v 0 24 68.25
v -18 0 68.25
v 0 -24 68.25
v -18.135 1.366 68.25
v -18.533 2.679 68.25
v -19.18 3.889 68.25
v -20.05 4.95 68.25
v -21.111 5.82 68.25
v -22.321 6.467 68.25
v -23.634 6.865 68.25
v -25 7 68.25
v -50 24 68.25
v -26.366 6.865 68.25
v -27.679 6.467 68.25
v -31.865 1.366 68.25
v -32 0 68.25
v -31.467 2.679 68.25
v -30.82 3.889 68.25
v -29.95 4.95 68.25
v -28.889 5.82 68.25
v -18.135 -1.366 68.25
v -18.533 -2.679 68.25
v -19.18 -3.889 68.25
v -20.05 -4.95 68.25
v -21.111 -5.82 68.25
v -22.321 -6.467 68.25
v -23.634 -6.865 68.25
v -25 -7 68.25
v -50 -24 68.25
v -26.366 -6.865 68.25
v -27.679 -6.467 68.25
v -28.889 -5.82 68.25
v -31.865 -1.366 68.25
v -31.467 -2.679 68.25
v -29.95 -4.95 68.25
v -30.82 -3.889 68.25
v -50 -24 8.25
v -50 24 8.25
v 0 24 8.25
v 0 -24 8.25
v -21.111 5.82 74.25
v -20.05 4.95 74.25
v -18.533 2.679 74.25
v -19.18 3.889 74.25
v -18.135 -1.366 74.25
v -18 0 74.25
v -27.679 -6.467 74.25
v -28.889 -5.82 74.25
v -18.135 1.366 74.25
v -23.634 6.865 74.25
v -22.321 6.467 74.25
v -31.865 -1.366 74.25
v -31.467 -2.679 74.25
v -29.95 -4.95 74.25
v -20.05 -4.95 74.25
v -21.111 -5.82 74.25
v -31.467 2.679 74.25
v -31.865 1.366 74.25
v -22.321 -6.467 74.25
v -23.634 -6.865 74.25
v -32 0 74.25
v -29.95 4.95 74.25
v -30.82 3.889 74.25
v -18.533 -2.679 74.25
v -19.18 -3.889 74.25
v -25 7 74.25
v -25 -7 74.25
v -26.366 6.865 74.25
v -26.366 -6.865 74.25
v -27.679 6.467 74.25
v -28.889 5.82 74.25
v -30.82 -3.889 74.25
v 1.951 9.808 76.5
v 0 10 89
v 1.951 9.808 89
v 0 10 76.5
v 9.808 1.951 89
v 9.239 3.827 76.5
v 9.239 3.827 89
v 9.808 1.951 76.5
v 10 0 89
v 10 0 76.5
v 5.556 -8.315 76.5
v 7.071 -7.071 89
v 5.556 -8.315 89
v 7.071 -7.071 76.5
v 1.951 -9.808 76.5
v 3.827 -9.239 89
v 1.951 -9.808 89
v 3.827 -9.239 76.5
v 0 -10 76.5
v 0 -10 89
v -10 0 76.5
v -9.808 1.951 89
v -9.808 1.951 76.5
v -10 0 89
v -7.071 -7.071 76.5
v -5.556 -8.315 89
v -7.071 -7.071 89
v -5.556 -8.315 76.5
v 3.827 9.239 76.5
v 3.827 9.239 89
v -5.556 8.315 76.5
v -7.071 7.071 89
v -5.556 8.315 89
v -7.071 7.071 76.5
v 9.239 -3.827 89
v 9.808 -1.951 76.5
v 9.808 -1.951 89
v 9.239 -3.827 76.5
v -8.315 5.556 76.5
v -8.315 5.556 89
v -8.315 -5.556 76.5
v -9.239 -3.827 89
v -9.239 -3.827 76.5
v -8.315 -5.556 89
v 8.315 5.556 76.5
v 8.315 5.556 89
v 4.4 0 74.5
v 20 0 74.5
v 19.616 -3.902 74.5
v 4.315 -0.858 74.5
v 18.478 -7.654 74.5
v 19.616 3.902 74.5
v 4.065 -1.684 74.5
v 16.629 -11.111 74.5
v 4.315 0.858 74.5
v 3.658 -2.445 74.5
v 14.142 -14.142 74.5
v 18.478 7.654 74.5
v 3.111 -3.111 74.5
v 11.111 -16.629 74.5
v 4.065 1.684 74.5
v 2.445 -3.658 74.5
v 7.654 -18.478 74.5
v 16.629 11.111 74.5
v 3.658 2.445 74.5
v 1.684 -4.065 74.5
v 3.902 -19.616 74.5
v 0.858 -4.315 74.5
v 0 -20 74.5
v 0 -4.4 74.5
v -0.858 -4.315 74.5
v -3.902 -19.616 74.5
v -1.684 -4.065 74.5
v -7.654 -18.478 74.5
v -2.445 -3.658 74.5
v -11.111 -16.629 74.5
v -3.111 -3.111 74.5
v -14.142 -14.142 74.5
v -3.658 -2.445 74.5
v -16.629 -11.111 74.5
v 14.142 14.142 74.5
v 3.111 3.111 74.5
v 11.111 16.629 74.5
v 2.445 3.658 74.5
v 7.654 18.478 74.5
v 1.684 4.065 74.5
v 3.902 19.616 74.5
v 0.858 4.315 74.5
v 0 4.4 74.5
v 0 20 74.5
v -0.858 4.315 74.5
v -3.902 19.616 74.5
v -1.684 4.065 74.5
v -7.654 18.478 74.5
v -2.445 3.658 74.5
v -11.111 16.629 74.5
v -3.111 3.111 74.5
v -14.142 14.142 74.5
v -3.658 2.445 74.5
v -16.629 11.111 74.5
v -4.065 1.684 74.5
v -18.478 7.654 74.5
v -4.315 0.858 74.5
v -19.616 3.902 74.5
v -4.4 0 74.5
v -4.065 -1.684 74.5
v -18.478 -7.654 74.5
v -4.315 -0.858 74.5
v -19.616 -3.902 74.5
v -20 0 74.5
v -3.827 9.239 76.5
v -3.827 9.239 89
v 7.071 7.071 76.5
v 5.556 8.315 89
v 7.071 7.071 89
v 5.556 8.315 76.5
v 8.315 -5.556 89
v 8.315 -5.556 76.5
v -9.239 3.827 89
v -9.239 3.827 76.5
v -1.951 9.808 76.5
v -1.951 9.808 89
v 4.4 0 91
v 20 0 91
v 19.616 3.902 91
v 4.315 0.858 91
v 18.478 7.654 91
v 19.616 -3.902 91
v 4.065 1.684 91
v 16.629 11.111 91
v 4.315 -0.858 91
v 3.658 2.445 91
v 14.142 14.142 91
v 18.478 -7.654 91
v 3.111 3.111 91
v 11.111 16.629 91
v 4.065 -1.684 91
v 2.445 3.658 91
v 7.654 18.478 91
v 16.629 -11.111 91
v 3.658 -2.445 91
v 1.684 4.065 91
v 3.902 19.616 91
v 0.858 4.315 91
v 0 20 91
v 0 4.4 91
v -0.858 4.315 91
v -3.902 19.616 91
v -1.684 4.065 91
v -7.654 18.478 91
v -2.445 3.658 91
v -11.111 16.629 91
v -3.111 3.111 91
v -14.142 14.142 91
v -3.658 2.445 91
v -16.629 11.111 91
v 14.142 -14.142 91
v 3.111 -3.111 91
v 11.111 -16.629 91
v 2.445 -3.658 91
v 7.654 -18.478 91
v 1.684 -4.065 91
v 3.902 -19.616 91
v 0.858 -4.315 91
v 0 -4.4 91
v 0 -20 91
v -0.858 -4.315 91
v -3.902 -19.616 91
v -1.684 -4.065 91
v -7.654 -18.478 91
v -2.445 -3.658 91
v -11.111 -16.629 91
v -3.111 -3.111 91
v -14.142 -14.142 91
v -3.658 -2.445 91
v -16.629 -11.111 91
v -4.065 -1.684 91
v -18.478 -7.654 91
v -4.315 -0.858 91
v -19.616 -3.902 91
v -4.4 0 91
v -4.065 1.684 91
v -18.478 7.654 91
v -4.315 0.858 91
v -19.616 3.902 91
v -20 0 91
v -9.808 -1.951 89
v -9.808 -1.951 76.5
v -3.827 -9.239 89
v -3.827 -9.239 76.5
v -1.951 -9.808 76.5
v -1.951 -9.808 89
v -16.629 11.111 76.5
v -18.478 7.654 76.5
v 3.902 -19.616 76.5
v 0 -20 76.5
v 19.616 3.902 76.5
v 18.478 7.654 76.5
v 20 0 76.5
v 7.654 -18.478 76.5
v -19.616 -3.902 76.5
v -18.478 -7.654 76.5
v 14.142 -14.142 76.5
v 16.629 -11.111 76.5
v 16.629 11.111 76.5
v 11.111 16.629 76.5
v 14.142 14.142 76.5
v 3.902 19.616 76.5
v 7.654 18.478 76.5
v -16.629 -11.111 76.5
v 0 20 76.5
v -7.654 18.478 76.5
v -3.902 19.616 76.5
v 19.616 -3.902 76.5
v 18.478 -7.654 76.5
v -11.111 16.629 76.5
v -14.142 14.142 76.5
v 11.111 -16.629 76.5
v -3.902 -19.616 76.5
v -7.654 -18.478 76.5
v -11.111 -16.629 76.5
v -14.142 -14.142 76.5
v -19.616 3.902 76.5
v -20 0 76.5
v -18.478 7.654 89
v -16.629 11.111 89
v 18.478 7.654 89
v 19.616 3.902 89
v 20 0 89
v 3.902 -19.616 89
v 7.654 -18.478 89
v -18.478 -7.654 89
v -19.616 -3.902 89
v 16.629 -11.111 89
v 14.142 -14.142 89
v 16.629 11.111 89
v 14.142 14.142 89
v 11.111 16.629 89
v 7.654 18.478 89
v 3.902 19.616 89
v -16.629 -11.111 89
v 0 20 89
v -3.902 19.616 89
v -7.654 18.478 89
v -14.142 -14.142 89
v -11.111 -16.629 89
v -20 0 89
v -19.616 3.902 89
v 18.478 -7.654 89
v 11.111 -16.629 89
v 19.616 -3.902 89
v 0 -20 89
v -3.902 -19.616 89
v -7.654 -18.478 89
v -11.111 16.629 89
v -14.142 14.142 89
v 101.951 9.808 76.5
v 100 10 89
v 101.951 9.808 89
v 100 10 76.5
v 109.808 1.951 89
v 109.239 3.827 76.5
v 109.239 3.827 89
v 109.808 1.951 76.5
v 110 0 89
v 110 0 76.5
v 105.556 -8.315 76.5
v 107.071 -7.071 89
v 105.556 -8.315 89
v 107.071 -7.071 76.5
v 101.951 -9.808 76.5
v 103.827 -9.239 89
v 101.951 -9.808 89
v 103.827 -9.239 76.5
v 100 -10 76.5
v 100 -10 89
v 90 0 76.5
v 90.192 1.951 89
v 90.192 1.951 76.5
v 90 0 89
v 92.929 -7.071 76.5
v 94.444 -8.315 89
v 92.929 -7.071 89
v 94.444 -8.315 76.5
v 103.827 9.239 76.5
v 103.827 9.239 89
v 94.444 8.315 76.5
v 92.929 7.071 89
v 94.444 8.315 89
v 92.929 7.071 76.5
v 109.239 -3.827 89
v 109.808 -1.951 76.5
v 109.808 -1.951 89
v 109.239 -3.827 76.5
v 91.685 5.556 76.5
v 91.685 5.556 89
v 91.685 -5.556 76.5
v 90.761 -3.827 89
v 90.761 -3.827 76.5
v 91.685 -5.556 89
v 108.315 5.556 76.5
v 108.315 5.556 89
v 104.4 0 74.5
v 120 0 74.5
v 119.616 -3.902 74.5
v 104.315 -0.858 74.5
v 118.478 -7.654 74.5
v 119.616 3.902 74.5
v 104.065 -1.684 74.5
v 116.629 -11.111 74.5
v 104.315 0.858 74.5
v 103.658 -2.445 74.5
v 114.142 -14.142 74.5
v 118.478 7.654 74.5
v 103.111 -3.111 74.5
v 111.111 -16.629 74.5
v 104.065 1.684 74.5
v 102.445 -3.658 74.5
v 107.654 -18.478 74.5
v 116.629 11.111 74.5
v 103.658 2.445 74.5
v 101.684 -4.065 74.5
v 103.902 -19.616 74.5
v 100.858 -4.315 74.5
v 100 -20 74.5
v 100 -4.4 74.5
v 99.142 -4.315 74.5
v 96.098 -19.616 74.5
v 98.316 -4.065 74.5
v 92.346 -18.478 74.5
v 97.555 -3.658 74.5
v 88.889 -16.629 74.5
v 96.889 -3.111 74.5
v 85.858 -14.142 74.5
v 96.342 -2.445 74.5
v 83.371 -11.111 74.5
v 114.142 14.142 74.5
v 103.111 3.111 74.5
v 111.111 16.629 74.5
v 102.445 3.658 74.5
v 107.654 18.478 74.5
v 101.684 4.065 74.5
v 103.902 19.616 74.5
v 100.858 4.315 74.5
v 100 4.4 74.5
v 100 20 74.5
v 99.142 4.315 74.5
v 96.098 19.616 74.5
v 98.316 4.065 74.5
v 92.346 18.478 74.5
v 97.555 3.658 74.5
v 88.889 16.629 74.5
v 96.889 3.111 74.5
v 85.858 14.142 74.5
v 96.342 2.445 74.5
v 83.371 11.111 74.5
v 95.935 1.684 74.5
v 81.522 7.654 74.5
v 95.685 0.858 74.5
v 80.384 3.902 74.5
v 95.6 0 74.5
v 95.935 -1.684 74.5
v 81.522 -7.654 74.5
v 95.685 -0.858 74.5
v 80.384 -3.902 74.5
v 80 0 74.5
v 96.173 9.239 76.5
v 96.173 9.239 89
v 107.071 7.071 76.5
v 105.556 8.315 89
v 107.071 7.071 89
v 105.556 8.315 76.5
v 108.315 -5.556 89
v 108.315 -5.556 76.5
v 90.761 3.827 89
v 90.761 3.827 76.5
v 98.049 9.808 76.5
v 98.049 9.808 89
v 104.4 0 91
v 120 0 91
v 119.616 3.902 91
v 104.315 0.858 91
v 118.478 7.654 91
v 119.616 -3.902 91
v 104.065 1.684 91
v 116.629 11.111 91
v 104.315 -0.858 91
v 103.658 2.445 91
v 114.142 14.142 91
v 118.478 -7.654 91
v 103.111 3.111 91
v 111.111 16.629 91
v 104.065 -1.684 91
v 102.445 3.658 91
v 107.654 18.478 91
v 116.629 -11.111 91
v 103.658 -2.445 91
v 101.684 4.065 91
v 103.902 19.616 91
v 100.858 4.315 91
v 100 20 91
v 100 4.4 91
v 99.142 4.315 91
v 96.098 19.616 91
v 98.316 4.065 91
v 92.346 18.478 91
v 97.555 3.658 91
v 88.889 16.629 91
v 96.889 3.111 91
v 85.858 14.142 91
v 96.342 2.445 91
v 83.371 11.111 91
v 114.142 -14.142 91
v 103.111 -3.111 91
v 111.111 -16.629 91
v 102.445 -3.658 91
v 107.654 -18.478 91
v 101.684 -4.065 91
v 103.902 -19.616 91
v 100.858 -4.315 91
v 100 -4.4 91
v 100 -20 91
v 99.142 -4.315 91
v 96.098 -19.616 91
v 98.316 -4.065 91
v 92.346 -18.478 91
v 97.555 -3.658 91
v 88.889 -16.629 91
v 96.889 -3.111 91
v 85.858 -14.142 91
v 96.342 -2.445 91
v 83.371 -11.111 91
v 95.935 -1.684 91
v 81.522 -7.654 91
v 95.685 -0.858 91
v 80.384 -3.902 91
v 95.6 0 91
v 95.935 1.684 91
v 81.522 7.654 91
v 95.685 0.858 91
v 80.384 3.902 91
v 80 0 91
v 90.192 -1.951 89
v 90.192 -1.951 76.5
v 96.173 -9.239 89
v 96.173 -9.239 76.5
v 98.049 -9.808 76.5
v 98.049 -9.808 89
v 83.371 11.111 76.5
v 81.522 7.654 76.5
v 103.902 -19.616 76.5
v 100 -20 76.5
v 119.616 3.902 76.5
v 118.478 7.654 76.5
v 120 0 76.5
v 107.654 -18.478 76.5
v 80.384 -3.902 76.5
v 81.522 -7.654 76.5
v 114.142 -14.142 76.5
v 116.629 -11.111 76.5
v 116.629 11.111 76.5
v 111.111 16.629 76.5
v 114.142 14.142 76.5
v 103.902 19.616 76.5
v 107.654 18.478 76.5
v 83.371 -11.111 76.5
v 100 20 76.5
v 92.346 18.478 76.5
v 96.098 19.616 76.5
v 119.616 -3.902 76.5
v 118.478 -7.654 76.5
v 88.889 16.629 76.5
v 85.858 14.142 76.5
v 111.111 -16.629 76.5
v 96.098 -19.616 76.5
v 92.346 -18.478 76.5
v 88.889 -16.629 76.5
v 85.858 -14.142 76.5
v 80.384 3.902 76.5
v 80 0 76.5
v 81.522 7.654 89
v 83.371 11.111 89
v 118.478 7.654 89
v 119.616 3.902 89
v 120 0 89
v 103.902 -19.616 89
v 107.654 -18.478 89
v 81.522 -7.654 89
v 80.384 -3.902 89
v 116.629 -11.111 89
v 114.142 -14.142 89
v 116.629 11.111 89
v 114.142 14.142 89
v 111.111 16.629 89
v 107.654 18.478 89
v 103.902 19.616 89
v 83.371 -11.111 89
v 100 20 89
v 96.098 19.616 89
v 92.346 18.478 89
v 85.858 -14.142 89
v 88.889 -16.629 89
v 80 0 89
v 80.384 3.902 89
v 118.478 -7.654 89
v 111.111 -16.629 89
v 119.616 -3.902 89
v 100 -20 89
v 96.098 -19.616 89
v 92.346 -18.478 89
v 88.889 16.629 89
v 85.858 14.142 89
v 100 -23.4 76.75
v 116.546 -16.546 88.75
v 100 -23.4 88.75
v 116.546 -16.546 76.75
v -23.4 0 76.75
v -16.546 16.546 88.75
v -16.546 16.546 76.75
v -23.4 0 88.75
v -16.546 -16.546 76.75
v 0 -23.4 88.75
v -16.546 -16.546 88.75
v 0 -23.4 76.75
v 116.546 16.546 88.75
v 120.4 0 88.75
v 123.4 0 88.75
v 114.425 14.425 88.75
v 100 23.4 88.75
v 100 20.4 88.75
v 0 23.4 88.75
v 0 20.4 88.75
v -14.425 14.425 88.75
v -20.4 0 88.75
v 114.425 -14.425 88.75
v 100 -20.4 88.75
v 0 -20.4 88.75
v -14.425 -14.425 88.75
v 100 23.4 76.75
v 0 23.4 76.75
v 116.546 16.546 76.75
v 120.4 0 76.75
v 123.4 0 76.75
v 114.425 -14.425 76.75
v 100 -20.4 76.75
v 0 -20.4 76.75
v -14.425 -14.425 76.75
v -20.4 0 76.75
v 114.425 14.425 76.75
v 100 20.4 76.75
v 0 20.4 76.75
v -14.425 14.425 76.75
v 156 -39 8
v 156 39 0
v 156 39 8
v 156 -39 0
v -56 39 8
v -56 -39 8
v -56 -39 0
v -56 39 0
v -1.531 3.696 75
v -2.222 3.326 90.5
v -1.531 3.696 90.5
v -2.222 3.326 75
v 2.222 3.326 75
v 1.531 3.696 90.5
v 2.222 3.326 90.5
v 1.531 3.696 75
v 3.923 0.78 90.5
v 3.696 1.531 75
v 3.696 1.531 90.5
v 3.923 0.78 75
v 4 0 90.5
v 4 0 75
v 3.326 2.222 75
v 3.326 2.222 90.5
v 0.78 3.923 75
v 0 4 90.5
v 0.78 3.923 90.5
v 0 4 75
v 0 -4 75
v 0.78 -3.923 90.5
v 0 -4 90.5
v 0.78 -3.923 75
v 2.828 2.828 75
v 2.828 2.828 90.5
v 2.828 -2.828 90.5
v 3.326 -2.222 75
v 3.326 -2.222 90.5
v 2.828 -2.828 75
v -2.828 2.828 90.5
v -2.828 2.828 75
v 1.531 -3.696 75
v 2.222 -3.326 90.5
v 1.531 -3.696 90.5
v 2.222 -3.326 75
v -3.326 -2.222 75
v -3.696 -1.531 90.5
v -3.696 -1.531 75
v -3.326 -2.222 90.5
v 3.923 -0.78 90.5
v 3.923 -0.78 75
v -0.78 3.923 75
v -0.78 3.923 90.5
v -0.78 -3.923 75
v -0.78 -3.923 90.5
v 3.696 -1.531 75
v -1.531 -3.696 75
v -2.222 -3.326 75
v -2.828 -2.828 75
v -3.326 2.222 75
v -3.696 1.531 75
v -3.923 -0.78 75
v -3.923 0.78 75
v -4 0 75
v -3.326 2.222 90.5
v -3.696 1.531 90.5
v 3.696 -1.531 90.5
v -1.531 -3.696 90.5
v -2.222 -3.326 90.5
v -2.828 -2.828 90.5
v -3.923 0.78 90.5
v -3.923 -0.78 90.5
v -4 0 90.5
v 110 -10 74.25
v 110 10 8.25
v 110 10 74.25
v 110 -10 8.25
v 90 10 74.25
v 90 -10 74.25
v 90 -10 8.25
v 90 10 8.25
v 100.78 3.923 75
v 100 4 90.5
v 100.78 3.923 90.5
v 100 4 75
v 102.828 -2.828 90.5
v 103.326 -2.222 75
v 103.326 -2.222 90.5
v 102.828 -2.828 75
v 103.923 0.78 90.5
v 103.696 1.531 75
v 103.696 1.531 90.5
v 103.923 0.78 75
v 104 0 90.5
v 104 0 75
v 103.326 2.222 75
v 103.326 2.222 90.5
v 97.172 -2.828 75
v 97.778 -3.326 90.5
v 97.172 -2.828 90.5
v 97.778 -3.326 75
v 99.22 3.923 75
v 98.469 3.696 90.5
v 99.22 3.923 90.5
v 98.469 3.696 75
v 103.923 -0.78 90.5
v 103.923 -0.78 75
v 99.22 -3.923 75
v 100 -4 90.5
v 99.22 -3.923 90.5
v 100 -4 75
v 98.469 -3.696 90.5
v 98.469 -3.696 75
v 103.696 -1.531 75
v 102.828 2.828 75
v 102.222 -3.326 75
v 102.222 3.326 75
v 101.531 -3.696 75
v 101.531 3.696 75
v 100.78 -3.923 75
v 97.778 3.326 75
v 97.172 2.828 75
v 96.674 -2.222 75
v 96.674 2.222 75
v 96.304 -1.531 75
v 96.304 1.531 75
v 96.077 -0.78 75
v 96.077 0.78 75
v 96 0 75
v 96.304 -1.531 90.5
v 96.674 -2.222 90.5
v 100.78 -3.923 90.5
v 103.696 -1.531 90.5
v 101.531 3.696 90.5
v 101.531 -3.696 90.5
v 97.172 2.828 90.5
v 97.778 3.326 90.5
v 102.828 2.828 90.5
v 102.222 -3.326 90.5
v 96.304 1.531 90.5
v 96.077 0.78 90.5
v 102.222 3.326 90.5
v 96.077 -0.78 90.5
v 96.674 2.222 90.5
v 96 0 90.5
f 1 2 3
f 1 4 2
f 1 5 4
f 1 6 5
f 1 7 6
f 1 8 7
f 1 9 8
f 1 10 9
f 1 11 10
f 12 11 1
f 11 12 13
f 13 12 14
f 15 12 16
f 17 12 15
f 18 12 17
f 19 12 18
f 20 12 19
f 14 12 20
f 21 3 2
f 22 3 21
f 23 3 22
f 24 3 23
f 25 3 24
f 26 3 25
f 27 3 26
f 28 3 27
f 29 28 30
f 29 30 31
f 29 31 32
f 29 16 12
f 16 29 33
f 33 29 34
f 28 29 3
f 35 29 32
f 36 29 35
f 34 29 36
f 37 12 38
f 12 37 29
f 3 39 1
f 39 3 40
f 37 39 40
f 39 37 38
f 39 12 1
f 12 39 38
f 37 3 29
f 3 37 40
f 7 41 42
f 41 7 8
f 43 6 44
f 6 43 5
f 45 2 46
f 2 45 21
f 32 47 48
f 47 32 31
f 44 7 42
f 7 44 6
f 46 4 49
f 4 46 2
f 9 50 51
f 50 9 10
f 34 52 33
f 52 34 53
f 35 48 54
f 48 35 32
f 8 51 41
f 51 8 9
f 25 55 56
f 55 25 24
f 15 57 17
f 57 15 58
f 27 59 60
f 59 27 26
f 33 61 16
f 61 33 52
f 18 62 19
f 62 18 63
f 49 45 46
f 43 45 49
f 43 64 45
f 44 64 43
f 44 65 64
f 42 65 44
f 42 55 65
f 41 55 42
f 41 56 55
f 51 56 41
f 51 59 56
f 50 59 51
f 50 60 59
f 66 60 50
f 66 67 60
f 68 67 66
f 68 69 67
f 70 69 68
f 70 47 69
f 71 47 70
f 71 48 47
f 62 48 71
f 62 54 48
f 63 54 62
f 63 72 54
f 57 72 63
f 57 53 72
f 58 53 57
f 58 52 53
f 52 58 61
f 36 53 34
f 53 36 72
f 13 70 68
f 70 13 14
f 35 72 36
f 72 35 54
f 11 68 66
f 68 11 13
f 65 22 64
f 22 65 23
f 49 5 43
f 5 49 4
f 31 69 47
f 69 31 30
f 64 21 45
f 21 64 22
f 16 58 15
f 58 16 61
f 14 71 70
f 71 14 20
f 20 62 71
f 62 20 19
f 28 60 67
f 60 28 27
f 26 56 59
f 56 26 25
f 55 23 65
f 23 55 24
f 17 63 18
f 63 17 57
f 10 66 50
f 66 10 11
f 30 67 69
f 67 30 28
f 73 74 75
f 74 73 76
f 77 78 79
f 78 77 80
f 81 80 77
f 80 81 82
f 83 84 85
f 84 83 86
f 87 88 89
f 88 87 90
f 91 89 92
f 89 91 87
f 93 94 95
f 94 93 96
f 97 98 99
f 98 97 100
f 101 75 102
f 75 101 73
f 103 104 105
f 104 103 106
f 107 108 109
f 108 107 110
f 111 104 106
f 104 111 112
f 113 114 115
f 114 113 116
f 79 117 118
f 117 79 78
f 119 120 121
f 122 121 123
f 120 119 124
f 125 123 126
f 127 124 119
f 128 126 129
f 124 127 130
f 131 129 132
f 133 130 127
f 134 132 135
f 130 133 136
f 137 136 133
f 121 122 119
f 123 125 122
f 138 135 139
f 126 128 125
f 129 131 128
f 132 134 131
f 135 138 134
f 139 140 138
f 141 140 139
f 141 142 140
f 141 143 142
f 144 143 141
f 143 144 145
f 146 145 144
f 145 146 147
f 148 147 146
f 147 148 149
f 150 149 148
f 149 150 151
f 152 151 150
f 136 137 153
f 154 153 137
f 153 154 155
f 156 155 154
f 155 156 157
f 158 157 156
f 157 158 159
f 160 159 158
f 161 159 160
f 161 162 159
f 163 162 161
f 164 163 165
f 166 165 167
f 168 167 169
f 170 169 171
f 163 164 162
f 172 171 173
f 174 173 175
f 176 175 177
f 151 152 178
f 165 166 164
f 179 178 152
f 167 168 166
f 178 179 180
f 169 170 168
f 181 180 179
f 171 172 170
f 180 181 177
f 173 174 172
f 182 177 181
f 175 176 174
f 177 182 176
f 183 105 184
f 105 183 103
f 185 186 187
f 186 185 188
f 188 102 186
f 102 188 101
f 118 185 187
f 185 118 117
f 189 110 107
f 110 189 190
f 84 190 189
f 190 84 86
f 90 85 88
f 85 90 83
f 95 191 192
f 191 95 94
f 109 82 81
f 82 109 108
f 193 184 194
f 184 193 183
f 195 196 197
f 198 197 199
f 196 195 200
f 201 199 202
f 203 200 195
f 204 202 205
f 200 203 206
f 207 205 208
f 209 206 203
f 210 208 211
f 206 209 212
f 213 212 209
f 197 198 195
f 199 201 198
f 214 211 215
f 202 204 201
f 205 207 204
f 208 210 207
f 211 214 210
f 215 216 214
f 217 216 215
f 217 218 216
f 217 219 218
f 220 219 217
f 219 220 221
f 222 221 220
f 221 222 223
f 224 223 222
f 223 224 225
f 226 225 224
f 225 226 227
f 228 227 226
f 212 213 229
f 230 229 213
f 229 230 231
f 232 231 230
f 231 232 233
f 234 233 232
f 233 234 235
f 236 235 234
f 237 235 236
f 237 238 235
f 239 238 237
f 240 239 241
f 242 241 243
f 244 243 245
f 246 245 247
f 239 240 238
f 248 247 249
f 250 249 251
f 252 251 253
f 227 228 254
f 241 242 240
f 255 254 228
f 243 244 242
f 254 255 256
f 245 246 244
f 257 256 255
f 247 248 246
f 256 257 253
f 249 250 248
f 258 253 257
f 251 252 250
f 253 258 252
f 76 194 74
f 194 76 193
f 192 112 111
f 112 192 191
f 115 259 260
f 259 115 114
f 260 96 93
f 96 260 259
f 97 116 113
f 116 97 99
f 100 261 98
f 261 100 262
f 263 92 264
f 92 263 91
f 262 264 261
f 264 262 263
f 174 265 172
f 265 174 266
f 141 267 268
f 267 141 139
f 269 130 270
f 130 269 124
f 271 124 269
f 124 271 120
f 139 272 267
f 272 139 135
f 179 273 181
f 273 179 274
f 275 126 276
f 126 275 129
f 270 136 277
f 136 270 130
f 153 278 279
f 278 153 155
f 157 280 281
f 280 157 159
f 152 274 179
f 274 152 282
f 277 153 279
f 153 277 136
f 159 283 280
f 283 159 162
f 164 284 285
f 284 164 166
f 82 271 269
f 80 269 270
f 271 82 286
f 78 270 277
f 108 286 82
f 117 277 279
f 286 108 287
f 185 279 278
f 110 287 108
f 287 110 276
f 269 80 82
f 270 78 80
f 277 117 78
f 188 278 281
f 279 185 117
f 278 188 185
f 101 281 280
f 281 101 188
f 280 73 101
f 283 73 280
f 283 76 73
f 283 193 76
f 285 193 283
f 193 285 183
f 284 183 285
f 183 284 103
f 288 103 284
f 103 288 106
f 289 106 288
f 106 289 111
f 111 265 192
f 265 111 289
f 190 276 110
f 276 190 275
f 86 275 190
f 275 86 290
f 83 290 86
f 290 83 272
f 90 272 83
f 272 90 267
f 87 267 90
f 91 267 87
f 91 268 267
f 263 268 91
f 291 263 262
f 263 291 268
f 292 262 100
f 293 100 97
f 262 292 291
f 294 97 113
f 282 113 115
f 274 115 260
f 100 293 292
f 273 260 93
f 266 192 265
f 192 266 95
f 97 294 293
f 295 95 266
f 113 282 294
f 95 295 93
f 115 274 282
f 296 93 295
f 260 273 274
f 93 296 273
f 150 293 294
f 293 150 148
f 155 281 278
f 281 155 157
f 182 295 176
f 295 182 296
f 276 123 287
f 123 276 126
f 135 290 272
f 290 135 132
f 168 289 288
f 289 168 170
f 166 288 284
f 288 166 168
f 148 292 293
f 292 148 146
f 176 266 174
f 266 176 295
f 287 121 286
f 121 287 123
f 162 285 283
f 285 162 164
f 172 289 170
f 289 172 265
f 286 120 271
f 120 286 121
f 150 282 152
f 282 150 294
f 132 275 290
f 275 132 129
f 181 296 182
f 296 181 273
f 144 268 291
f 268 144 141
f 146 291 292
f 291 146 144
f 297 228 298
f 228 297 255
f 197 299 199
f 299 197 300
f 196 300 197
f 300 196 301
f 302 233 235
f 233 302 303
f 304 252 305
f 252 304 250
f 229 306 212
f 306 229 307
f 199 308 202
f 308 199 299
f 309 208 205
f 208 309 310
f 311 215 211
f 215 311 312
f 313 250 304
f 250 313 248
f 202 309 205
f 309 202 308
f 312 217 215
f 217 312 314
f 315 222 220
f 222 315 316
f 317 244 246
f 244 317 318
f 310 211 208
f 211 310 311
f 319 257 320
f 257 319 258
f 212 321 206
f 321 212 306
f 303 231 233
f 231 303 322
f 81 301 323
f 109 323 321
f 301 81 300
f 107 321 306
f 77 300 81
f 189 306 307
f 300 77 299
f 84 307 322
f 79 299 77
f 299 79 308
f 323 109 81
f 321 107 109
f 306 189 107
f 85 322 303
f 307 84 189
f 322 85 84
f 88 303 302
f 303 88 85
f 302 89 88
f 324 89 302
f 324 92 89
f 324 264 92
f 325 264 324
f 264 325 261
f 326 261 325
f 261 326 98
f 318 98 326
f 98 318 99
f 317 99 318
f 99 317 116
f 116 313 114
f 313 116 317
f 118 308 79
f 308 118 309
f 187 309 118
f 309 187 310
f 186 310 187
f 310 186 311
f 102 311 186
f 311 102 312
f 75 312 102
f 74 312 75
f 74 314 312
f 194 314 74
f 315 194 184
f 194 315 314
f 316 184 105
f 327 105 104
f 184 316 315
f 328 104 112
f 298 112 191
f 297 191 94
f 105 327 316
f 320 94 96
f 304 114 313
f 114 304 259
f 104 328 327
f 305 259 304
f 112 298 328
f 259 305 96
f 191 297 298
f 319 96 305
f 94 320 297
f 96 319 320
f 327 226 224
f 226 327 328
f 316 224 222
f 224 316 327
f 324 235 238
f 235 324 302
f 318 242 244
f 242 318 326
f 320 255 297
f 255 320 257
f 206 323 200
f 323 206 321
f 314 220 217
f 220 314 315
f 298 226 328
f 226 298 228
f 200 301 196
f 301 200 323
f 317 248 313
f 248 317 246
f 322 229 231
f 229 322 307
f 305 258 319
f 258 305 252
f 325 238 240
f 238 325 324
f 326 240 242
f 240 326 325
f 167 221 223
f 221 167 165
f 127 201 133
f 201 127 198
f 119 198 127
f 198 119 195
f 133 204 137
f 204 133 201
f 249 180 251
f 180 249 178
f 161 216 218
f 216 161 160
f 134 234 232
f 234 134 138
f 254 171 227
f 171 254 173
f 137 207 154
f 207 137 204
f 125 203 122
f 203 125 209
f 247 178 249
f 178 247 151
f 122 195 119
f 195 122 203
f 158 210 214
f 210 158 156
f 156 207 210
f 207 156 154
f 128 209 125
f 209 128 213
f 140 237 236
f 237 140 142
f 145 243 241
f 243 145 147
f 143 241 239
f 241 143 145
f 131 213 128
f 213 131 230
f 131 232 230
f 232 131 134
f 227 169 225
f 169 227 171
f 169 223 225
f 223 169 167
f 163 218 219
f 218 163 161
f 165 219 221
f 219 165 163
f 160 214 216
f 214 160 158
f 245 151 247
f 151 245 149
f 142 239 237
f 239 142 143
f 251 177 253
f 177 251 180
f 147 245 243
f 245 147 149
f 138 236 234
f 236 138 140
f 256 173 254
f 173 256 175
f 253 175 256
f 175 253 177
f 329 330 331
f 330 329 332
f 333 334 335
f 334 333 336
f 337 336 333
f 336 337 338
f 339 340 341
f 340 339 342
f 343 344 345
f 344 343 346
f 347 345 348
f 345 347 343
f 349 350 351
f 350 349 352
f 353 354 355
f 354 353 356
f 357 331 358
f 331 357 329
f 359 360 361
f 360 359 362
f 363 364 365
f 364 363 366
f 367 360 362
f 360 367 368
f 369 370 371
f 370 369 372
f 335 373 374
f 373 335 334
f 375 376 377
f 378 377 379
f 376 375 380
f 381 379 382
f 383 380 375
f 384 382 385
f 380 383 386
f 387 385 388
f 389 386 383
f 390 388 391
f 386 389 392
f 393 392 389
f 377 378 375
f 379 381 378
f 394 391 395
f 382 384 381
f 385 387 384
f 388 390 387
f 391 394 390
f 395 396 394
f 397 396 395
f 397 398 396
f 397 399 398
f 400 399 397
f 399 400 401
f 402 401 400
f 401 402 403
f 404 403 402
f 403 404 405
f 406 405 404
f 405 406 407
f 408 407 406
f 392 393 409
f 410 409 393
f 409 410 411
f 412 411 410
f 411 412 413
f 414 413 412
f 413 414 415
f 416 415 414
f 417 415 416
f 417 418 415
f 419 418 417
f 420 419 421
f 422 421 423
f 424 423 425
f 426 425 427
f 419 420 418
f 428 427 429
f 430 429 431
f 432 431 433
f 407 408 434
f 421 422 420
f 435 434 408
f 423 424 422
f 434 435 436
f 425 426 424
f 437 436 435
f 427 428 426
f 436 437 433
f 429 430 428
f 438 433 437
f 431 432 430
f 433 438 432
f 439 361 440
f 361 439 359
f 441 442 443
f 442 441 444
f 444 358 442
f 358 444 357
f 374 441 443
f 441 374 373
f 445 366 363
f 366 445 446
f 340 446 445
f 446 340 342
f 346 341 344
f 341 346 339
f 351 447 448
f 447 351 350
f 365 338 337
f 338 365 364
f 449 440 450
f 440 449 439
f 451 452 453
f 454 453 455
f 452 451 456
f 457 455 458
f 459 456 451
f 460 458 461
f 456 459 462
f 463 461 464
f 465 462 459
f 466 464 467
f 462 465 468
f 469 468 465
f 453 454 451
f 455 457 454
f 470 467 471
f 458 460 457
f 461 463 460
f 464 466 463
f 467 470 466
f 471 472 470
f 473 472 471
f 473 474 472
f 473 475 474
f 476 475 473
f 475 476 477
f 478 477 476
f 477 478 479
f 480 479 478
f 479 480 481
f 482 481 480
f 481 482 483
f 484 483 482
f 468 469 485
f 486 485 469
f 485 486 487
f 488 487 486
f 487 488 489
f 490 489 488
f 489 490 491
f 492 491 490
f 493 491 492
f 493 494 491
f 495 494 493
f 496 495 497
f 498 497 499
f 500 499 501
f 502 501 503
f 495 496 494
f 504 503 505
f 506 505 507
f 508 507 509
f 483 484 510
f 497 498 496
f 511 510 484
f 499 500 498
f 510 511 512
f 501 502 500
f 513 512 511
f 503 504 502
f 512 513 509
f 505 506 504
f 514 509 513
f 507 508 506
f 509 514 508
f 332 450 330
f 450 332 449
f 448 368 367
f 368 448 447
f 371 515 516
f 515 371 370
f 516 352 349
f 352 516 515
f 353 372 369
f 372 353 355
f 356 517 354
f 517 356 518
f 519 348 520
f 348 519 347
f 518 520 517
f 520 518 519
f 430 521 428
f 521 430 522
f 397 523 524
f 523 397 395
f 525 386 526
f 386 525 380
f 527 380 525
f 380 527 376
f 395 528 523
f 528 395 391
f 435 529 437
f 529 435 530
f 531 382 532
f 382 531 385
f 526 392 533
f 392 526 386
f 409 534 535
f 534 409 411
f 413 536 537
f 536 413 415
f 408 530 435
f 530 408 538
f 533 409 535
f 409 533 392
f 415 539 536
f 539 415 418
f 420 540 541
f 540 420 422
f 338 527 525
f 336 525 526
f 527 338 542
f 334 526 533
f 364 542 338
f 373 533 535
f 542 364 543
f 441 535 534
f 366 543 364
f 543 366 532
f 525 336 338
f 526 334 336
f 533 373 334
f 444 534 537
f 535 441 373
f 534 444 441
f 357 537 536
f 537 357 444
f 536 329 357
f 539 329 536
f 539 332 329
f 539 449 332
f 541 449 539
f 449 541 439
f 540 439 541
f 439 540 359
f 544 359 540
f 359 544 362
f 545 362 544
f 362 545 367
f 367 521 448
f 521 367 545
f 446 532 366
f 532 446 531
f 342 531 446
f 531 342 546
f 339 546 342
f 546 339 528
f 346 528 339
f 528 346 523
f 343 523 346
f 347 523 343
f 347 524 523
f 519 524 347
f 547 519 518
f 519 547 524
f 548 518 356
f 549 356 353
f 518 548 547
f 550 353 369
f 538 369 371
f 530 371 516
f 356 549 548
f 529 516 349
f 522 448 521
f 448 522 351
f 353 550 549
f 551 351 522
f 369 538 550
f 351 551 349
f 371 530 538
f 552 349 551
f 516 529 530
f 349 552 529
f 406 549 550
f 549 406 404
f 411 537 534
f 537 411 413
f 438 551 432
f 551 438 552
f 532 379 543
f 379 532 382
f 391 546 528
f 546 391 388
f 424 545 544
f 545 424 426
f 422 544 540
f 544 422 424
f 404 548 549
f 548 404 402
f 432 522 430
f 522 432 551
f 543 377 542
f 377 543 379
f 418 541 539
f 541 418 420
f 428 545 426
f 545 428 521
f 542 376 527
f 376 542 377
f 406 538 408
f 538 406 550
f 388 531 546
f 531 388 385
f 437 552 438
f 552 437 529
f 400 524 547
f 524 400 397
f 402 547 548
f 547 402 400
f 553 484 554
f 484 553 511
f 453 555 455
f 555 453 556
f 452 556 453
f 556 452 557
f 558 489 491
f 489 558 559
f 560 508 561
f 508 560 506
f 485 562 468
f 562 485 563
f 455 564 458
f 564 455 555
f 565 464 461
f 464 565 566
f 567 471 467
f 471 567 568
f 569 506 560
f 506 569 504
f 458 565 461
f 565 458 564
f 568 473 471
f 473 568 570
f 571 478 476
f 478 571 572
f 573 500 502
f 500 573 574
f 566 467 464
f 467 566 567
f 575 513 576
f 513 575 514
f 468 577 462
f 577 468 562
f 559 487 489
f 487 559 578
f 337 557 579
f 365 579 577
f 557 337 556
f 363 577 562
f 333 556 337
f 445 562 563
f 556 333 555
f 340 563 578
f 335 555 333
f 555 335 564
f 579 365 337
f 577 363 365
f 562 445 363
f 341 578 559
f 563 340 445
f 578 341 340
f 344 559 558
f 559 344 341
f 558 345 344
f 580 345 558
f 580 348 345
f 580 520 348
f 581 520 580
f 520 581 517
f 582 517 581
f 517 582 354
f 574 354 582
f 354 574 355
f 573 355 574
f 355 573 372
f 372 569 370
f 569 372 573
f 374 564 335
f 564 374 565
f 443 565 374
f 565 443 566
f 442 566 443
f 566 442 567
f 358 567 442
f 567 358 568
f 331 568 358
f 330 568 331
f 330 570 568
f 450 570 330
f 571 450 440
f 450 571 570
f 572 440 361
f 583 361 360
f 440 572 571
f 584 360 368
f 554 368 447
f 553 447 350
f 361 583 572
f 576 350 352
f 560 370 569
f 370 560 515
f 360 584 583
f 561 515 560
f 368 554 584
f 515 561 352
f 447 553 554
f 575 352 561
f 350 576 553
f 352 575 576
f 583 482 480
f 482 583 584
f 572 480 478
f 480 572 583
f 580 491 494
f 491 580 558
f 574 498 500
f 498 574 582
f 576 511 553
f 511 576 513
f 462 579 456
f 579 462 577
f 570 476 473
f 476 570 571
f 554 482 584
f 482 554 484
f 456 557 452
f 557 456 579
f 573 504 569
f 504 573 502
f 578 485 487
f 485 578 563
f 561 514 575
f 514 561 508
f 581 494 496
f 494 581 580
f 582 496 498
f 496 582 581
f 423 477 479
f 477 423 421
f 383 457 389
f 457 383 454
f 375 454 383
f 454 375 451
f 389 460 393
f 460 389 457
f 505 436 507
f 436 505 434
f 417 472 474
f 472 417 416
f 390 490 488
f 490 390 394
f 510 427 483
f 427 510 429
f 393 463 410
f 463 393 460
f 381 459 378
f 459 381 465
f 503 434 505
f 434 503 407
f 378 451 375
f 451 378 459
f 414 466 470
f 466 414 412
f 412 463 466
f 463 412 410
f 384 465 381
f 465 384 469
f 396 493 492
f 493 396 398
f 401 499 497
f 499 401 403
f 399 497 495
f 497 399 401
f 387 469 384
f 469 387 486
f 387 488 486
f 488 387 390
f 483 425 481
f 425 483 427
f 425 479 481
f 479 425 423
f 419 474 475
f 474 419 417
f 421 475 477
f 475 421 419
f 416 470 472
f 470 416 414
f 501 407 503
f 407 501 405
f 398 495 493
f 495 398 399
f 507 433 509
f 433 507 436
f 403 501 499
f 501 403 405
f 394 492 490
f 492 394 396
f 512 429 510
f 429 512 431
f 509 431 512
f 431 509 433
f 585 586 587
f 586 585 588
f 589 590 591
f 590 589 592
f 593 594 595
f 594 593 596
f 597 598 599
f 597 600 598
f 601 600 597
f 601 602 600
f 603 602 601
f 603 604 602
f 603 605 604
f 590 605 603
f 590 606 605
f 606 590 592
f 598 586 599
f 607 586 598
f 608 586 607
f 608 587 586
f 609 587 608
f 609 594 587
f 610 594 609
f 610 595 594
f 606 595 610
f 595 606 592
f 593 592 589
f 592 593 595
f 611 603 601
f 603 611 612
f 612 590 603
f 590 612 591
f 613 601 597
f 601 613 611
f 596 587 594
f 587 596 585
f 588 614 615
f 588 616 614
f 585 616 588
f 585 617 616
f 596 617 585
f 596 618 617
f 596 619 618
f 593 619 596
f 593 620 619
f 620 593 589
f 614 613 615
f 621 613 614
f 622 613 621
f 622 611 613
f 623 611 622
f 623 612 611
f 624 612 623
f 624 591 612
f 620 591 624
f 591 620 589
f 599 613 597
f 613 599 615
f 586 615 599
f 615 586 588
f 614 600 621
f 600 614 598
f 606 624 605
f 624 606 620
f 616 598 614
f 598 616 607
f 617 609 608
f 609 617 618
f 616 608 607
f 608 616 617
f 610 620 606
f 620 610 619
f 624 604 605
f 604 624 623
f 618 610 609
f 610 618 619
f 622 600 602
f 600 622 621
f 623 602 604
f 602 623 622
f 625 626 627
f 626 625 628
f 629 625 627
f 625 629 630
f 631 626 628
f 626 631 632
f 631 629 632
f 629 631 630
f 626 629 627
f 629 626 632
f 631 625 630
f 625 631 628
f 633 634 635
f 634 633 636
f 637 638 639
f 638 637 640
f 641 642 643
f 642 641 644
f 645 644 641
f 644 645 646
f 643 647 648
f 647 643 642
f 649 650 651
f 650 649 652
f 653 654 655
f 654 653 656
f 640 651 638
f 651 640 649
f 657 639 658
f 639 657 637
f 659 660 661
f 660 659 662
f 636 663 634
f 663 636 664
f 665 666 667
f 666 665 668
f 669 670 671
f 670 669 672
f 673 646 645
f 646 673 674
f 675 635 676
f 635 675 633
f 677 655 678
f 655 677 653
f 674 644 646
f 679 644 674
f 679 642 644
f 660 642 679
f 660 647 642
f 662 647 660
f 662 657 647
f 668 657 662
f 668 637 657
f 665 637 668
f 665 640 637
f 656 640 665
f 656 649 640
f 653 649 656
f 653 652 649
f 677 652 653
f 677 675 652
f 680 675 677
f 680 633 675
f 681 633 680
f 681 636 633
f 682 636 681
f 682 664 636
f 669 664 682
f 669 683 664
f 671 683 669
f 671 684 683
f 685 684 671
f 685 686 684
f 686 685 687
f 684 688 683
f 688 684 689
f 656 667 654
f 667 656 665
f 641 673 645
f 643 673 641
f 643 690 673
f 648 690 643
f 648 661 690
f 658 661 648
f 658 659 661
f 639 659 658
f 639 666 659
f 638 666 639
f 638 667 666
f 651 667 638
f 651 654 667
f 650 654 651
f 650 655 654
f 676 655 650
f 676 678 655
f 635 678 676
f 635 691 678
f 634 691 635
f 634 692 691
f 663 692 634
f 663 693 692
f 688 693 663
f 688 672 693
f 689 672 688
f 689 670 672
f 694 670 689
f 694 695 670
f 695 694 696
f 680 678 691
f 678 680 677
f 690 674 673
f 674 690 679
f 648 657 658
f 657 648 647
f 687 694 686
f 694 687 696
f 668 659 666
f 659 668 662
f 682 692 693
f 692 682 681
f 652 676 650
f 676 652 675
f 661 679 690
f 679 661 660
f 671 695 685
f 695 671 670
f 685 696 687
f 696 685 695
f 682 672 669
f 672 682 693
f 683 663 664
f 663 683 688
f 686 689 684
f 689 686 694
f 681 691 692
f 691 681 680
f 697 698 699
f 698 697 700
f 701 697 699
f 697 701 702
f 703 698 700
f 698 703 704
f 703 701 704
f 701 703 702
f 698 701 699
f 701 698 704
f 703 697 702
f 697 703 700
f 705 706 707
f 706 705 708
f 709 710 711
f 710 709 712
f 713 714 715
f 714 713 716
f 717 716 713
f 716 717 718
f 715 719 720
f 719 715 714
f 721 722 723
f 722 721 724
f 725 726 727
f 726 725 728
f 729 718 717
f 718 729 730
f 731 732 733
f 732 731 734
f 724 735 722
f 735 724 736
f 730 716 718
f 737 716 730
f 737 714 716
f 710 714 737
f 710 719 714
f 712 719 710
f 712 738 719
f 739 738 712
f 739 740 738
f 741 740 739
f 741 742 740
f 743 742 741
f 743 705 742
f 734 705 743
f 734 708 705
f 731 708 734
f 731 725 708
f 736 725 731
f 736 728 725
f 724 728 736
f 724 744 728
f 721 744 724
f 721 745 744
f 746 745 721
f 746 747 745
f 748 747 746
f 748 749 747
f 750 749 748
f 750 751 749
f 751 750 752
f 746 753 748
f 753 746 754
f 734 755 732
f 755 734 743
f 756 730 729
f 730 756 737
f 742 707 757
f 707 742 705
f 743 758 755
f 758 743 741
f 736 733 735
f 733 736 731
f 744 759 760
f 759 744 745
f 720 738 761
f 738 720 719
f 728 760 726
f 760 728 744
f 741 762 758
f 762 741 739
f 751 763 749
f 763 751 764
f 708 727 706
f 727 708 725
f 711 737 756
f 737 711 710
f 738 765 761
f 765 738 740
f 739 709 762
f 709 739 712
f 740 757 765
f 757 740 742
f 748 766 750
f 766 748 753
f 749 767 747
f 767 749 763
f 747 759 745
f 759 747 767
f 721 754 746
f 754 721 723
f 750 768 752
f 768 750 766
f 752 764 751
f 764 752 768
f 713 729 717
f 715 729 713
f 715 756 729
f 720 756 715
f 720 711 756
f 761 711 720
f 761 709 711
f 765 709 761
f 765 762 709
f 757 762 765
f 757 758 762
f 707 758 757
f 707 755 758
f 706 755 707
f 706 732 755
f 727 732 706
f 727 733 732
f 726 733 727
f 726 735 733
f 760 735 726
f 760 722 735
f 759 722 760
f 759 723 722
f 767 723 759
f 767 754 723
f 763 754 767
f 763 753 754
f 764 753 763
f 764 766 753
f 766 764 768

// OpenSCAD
$fn = 32;

// ------------------------------------------------------------------------
// Motor belt drive: span 100 mm, pulleys d40, belt 12 mm wide
// Every part is its own module, assembly() places every instance.
// ------------------------------------------------------------------------

// --- part 1 ---
module base_plate() {
  difference() {
    translate([-106, -39, 0]) cube([212, 78, 8]);
  }
}

// --- part 2 ---
module motor() {
  union() {
    translate([-30, -24, 0]) cube([60, 48, 50]);
    translate([33, 0, 25]) rotate([0, 90, 0]) cylinder(h = 6, d = 14, center = true);
  }
}

// --- part 3 ---
module drive_shaft() {
  translate([0, 0, -7.75]) cylinder(h = 15.5, d = 8);
}

// --- part 4 ---
module pulley_drive() {
  difference() {
    union() {
      cylinder(h = 16.5, d = 20);
      cylinder(h = 2, d = 40);
      translate([0, 0, 14.5]) cylinder(h = 2, d = 40);
    }
    translate([0, 0, -1]) cylinder(h = 18.5, d = 8.8);
  }
}

// --- part 5 ---
module idler_post() {
  translate([-10, -10, 0]) cube([20, 20, 66]);
}

// --- part 6 ---
module driven_shaft() {
  translate([0, 0, -7.75]) cylinder(h = 15.5, d = 8);
}

// --- part 7 ---
module pulley_driven() {
  difference() {
    union() {
      cylinder(h = 16.5, d = 20);
      cylinder(h = 2, d = 40);
      translate([0, 0, 14.5]) cylinder(h = 2, d = 40);
    }
    translate([0, 0, -1]) cylinder(h = 18.5, d = 8.8);
  }
}

// --- part 8 ---
module drive_belt() {
  difference() {
    linear_extrude(height = 12) polygon(points = concat([for (a = [90 : 45 : 270]) [23.4 * cos(a), 23.4 * sin(a)]], [for (a = [270 : 45 : 450]) [100 + 23.4 * cos(a), 23.4 * sin(a)]]));
    translate([0, 0, -1]) linear_extrude(height = 14) polygon(points = concat([for (a = [90 : 45 : 270]) [20.4 * cos(a), 20.4 * sin(a)]], [for (a = [270 : 45 : 450]) [100 + 20.4 * cos(a), 20.4 * sin(a)]]));
  }
}

// --- assembly ---
module assembly() {
  color([0.80, 0.24, 0.20]) translate([50, 0, 0]) rotate([0, 0, 0]) base_plate();
  color([0.20, 0.45, 0.75]) translate([0, 0, 38.25]) rotate([0, 270, 0]) motor();
  color([0.25, 0.62, 0.32]) translate([0, 0, 82.75]) rotate([0, 0, 0]) drive_shaft();
  color([0.92, 0.70, 0.18]) translate([0, 0, 74.5]) rotate([0, 0, 0]) pulley_drive();
  color([0.58, 0.35, 0.70]) translate([100, 0, 8.25]) rotate([0, 0, 0]) idler_post();
  color([0.16, 0.66, 0.66]) translate([100, 0, 82.75]) rotate([0, 0, 0]) driven_shaft();
  color([0.85, 0.48, 0.18]) translate([100, 0, 74.5]) rotate([0, 0, 0]) pulley_driven();
  color([0.55, 0.60, 0.65]) translate([0, 0, 76.75]) rotate([0, 0, 0]) drive_belt();
}

assembly();
